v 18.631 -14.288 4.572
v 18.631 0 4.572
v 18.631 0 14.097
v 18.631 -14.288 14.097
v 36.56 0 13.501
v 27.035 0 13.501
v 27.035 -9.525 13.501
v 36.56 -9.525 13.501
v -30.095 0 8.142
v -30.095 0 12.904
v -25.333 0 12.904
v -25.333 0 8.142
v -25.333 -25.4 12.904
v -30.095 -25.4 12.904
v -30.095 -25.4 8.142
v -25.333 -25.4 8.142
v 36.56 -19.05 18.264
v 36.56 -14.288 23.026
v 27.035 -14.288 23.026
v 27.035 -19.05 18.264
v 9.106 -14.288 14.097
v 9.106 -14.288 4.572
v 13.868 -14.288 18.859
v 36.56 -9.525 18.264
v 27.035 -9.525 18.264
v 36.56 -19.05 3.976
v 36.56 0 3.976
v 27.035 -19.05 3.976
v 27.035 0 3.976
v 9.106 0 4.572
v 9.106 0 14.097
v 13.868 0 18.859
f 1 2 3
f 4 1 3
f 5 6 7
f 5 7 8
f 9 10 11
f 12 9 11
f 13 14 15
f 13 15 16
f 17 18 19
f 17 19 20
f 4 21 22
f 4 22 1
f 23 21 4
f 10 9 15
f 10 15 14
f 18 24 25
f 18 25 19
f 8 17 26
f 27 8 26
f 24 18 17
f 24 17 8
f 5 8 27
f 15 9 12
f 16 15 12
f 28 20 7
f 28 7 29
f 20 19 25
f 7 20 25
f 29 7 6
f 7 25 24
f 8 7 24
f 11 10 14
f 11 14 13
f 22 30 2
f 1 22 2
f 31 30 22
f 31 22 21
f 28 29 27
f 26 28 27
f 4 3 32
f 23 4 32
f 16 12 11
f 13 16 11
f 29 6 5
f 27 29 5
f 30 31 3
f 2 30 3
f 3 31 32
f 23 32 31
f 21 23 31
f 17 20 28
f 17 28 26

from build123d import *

# Parameters (mm, degrees)
F0_W      = 4.7625
F0_H      = 4.7625
F1_DEPTH  = 25.4
F2_W      = 9.525
F2_H      = 9.525
F3_DEPTH  = 14.2875
F5_DEPTH  = 14.2875
F6_W      = 9.525
F6_H      = 9.525
F7_DEPTH  = 19.05
F8_W      = 9.525
F8_H      = 4.7625
F9_DEPTH  = 9.525
F11_DEPTH = 9.525


with BuildPart() as f1:
    # F0 (on Front) → F1 (new body)
    with BuildSketch(Plane.XZ):
        with Locations((-27.7138361707, 10.5231681079)):
            Rectangle(F0_W, F0_H)
    extrude(amount=F1_DEPTH)


with BuildPart() as f3:
    # F2 (on Front) → F3 (new body)
    with BuildSketch(Plane.XZ):
        with Locations((13.8682615355, 9.33401566)):
            Rectangle(F2_W, F2_H)
    extrude(amount=F3_DEPTH)

    # F4 (on face) → F5 (join)
    with BuildSketch(Plane.XZ.offset(14.2875)):
        Polygon((18.6307615355, 14.09651566), (13.8682615355, 18.85901566), (9.1057615355, 14.09651566), align=None)
    extrude(amount=-F5_DEPTH)


with BuildPart() as f7:
    # F6 (on Front) → F7 (new body)
    with BuildSketch(Plane.XZ):
        with Locations((31.7975869402, 8.7385558866)):
            Rectangle(F6_W, F6_H)
    extrude(amount=F7_DEPTH)

    # F8 (on face) → F9 (join)
    with BuildSketch(Plane.XZ.offset(19.05)):
        with Locations((31.7975869402, 15.8823058866)):
            Rectangle(F8_W, F8_H)
    extrude(amount=-F9_DEPTH)

    # F10 (on face) → F11 (join)
    with BuildSketch(Plane.YZ.offset(36.5600869402)):
        Polygon((-9.525, 18.2635558866), (-14.2875, 23.0260558866), (-19.05, 18.2635558866), align=None)
    extrude(amount=-F11_DEPTH)


solid = Compound([f1.part, f3.part, f7.part])
